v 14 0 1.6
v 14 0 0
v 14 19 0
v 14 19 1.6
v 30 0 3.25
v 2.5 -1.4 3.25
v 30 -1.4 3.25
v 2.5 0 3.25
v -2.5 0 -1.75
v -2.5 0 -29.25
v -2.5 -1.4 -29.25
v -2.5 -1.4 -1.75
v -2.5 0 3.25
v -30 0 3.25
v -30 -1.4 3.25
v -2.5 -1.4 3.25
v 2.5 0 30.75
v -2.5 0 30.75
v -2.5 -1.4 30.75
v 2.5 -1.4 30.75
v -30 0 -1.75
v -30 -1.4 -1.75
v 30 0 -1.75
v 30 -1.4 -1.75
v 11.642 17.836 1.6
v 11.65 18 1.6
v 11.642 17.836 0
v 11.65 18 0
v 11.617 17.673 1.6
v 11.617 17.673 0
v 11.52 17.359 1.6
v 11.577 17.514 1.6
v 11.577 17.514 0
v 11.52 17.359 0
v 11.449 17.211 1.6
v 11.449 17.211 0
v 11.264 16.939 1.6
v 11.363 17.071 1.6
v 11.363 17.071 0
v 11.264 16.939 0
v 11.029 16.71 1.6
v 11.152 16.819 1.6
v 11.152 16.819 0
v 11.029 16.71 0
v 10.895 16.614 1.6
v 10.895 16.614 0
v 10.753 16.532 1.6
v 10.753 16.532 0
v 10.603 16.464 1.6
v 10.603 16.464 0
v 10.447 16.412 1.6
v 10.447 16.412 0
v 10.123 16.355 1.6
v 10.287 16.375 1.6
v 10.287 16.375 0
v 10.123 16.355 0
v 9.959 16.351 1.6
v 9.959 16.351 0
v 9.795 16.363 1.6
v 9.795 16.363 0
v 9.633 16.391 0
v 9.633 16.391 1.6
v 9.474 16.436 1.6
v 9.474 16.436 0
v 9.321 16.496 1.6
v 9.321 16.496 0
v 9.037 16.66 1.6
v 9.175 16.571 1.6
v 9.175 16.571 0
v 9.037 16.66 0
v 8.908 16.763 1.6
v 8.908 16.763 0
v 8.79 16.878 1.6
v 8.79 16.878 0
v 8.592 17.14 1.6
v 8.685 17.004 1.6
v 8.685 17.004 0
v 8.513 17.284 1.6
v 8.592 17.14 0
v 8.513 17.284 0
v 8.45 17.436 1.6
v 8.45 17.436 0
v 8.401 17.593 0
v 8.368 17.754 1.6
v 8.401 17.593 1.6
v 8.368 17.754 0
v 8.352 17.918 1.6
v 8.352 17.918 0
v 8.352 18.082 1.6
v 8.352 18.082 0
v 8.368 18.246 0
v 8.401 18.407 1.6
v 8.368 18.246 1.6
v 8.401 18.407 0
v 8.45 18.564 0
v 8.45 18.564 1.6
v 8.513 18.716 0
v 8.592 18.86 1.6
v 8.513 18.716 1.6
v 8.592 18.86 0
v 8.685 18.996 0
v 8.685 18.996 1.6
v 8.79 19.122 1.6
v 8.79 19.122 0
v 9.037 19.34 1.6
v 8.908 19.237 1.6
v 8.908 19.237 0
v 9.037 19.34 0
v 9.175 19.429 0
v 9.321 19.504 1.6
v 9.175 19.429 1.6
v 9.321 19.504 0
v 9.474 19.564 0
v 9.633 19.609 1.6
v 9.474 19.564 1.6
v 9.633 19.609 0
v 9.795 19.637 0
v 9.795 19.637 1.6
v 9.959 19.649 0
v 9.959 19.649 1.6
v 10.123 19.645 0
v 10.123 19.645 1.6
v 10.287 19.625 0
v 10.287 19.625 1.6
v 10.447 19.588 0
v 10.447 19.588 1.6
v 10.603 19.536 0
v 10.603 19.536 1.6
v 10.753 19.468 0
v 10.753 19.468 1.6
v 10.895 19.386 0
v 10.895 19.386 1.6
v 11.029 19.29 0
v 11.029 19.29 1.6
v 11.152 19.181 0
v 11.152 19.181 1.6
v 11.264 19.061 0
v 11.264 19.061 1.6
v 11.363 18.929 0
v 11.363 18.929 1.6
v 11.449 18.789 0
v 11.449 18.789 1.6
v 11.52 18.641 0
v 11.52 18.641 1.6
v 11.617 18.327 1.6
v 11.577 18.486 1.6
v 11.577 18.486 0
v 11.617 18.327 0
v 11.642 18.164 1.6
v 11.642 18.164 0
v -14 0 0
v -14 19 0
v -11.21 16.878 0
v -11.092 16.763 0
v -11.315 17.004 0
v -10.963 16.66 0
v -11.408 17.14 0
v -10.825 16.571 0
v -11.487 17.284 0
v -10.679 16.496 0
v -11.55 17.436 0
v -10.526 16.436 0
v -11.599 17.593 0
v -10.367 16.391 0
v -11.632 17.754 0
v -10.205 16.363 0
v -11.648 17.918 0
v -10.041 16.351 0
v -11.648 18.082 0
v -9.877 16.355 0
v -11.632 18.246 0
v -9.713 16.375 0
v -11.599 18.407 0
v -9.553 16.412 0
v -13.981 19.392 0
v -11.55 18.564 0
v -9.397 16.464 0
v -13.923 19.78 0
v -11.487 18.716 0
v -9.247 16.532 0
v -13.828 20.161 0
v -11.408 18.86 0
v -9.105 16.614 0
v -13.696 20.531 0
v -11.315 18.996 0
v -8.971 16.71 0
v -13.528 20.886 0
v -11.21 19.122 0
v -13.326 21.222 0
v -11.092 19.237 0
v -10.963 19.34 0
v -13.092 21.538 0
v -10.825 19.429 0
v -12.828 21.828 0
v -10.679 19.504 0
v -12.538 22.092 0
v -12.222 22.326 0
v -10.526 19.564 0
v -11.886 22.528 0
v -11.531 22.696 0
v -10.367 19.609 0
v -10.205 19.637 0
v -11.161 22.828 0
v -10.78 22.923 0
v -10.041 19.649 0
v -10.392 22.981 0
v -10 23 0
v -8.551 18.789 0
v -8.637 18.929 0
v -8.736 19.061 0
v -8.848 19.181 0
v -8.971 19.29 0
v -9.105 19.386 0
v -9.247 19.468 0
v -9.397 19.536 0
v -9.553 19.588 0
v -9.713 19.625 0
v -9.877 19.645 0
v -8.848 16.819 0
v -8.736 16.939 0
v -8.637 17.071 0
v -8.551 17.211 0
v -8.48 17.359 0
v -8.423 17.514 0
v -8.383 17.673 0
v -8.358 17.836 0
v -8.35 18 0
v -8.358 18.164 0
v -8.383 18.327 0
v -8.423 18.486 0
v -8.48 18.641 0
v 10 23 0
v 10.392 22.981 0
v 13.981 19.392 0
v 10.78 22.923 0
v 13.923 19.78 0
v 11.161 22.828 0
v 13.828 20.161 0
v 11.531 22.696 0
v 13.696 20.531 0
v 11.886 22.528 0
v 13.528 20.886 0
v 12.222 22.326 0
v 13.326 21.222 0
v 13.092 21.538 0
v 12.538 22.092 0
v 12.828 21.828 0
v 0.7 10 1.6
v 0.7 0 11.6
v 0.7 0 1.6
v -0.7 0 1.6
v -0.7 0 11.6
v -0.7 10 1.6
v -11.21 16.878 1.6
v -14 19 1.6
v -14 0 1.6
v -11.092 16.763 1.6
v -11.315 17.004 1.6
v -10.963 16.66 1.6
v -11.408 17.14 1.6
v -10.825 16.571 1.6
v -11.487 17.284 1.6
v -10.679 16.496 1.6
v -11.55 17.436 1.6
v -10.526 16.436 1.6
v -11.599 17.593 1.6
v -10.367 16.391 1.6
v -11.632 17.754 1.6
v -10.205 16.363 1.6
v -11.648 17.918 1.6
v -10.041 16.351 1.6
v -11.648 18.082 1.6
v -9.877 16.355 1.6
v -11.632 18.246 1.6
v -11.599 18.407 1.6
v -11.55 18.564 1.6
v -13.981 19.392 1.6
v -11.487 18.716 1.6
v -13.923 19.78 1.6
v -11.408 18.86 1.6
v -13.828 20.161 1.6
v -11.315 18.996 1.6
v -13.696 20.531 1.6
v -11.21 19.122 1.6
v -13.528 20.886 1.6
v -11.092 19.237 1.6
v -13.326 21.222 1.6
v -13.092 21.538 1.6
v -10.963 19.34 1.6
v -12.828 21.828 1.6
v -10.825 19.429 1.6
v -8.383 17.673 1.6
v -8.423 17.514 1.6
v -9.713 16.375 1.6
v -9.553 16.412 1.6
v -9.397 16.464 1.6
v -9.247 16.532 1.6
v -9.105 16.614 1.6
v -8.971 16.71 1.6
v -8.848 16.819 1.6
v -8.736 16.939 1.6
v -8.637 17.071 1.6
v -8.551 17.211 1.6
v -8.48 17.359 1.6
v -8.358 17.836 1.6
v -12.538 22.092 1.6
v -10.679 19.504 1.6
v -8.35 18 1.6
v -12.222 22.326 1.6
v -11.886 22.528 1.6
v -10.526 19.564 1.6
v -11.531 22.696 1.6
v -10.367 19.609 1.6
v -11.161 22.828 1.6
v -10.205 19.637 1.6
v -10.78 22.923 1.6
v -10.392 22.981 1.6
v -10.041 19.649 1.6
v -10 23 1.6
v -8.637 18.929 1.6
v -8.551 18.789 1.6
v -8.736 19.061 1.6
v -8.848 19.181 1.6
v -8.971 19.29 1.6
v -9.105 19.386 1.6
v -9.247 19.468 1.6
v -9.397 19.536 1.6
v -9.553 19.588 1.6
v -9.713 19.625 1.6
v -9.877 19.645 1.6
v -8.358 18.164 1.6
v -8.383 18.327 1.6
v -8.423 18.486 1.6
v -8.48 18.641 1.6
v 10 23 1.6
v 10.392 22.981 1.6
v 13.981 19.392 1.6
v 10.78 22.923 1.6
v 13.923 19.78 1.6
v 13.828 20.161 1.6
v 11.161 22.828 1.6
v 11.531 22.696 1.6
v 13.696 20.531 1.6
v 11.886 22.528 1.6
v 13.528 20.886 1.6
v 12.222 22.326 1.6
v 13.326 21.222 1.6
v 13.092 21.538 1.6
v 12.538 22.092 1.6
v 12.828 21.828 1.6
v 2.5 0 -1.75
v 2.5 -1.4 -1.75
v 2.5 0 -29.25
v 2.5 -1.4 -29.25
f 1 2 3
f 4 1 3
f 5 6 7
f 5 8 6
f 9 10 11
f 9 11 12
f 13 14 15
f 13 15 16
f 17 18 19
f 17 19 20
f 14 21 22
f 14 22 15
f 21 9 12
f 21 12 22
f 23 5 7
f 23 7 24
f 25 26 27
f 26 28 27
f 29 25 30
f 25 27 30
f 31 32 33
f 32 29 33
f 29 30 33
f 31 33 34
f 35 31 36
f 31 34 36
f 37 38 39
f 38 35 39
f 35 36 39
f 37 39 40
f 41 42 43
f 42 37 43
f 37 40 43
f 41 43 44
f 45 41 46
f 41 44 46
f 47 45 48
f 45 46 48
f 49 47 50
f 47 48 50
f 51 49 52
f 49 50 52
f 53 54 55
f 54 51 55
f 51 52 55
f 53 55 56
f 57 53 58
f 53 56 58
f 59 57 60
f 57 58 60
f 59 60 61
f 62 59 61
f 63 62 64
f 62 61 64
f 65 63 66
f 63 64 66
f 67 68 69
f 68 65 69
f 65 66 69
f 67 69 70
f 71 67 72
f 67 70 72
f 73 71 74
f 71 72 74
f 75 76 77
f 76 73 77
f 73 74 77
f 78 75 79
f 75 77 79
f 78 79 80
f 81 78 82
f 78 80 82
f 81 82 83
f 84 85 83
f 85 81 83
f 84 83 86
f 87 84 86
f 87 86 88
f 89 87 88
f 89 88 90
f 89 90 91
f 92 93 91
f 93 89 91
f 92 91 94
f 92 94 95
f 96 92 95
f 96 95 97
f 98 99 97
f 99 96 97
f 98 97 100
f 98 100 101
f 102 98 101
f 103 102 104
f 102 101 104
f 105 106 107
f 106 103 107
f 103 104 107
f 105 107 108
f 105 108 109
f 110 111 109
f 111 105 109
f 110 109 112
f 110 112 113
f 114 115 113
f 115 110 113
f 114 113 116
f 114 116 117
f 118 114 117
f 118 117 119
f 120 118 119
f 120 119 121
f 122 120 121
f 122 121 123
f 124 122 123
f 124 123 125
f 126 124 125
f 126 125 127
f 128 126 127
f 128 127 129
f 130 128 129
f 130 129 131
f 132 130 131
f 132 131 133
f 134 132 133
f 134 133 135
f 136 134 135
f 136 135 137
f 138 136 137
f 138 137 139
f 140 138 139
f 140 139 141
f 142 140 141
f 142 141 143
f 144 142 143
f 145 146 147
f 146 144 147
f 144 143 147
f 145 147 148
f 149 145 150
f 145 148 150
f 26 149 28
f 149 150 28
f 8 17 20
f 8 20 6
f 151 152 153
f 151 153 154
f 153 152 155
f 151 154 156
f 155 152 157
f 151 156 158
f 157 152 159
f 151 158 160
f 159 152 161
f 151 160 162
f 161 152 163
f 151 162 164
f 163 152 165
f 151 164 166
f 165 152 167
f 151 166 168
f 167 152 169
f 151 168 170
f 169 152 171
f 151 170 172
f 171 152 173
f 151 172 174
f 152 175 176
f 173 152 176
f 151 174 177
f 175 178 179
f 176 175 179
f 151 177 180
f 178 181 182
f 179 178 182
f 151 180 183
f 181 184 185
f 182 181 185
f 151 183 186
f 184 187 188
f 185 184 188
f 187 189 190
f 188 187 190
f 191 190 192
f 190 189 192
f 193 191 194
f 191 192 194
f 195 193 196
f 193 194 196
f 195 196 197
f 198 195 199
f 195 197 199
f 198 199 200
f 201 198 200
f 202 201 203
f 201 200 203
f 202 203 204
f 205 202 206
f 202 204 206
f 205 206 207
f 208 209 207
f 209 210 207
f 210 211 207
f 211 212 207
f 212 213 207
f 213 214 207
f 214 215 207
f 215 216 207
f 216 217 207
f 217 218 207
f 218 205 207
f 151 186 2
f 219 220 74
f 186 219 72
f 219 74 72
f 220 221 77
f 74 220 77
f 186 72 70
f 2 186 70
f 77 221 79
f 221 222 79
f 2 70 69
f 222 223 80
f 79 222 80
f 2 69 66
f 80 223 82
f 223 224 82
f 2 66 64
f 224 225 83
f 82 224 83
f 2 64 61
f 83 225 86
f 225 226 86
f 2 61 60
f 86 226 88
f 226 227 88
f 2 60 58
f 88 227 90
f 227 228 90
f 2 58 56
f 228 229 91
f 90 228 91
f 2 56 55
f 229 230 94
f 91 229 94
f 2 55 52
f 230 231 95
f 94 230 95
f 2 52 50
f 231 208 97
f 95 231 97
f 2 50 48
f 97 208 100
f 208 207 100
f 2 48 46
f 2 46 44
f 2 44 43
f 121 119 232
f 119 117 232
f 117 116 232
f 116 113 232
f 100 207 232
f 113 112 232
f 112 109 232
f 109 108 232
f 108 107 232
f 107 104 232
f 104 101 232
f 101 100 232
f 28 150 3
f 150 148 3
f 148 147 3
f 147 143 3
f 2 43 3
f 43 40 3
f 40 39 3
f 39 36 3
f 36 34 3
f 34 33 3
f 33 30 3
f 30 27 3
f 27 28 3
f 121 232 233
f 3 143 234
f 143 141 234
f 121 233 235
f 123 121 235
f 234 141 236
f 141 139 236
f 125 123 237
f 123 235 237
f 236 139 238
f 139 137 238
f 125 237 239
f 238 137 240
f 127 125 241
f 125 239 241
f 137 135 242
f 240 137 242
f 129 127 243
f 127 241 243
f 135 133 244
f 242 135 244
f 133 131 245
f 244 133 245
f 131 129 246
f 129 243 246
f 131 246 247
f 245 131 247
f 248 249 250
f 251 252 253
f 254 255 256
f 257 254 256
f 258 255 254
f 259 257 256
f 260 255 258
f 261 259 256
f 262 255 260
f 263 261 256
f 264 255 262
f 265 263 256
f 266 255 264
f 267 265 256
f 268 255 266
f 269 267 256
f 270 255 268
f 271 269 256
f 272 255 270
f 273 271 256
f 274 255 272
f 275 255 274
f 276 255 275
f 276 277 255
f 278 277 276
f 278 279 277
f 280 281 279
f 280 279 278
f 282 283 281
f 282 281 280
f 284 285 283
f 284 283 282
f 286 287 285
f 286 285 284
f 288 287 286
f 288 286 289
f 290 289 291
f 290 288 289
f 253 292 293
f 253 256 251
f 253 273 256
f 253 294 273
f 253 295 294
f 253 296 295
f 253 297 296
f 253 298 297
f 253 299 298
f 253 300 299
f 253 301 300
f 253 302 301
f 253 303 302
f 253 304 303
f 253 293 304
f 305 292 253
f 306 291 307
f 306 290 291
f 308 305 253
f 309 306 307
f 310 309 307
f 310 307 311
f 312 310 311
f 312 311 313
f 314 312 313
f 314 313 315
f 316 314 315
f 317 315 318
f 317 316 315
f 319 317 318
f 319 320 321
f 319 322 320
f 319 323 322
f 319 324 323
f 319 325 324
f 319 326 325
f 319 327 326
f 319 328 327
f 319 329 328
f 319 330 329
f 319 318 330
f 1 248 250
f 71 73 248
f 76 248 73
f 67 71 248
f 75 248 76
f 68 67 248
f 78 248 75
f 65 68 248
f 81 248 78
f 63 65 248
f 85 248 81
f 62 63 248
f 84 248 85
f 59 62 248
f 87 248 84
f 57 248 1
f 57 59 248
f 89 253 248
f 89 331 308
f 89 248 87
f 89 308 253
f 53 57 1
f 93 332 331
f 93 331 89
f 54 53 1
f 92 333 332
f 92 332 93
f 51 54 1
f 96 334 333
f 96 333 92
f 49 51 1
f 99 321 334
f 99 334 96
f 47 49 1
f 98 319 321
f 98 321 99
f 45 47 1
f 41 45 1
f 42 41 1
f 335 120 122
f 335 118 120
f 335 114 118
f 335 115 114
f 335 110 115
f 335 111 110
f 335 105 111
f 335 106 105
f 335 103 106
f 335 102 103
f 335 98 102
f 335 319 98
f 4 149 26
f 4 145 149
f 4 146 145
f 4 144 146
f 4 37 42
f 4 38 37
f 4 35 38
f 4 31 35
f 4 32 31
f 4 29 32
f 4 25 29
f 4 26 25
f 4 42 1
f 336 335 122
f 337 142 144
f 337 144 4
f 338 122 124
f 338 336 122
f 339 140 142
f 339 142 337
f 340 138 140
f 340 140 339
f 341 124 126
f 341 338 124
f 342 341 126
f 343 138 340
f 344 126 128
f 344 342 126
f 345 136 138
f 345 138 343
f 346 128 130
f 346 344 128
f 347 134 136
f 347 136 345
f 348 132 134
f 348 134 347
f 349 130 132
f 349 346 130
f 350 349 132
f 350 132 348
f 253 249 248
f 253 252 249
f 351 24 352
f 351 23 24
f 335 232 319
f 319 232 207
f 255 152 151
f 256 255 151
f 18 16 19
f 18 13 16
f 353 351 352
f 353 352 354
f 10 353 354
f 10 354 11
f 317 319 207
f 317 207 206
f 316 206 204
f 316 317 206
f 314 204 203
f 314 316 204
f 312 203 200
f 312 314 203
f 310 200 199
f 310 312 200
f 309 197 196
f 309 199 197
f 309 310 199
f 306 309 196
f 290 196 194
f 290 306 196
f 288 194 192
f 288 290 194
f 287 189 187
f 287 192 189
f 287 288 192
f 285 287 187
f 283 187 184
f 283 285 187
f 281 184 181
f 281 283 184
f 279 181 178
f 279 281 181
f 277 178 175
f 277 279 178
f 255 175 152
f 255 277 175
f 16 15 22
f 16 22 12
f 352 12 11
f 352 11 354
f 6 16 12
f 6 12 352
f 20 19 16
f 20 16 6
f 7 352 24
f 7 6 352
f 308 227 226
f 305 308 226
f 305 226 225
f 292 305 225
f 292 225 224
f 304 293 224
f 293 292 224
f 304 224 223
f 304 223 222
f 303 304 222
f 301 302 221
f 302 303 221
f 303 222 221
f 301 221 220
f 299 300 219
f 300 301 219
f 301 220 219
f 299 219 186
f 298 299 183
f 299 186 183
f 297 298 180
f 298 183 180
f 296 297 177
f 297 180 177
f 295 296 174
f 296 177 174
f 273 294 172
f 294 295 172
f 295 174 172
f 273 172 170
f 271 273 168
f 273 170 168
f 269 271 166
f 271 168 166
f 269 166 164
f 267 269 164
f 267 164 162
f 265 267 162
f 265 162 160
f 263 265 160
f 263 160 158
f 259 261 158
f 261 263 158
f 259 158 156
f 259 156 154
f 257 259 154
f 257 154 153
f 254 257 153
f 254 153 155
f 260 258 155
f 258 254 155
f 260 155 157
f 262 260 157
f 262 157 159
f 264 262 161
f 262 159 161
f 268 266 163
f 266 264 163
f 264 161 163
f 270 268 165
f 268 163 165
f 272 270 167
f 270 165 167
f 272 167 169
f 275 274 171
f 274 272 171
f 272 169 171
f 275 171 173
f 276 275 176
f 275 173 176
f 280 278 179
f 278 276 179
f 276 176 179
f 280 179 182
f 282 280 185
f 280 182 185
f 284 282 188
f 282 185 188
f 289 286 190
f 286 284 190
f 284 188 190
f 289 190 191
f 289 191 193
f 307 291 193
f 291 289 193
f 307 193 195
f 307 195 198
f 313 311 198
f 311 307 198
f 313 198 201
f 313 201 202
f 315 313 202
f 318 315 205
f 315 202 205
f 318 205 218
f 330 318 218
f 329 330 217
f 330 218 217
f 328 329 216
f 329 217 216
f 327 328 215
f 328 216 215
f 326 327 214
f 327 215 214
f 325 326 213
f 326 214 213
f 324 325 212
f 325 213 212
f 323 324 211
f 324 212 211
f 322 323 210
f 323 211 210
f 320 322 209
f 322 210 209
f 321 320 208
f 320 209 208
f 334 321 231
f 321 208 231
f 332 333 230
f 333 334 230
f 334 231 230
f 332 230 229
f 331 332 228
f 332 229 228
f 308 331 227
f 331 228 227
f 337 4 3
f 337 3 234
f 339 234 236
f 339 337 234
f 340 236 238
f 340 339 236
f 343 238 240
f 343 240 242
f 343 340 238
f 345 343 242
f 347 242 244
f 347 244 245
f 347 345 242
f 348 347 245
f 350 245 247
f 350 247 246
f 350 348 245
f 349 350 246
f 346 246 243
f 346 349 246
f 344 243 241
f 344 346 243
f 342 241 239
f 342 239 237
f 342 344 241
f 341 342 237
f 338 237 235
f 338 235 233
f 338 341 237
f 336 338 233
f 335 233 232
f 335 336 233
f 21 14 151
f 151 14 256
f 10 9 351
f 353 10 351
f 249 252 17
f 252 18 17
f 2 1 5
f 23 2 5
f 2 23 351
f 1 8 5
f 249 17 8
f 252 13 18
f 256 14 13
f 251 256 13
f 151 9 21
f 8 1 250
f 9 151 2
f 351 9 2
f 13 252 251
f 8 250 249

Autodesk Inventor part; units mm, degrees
ref_plane "YZ Plane" through (0, 0, 0) normal (1, 0, 0) x (0, 1, 0)
ref_plane "XZ Plane" through (0, 0, 0) normal (0, 1, 0) x (-1, 0, 0)
ref_plane "XY Plane" through (0, 0, 0) normal (0, 0, 1) x (1, 0, 0)
sketch "スケッチ1" plane through (0, 0, 0) normal (0, 0, 1) x (1, 0, 0)
  line L0 (-14, 0) -> (14, 0)
  line L1 (14, 0) -> (14, 23)
  line L2 (14, 23) -> (-14, 23)
  line L3 (-14, 23) -> (-14, 0)
  circle A0 centre (-10, 18) radius 1.65
  circle A1 centre (10, 18) radius 1.65
  point P0 (0, 0)
  dimension "d0" = 3.3
  dimension "d1" = 3.3
  dimension "d2" = 0
  dimension "d3" = 20
  dimension "d4" = 18
  dimension "d5" = 10
  dimension "d6" = 23
  dimension "d7" = 28
  dimension "d8" = 14
  dimension "d9" = 0
extrude "押し出し1" add sketch "スケッチ1" along normal blind 1.6
sketch "スケッチ2" plane through (-14, 0, 0) normal (0, -1, 0) x (1, 0, 0)
  line L0 (0, 0) -> (28, 0) projected
  line L1 (28, 0) -> (28, 1.6) projected
  line L2 (0, 1.6) -> (28, 1.6) projected
  line L3 (0, 0) -> (0, 1.6) projected
  line L4 (-16, 3.25) -> (44, 3.25)
  line L5 (44, 3.25) -> (44, -1.75)
  line L6 (44, -1.75) -> (-16, -1.75)
  line L7 (-16, -1.75) -> (-16, 3.25)
  line L8 (11.5, 30.75) -> (16.5, 30.75)
  line L9 (16.5, 30.75) -> (16.5, -29.25)
  line L10 (16.5, -29.25) -> (11.5, -29.25)
  line L11 (11.5, -29.25) -> (11.5, 30.75)
  point P0 (14, 0)
  dimension "d12" = 60
  dimension "d13" = 60
  dimension "d14" = 5
  dimension "d15" = 5
  dimension "d16" = 1.75
  dimension "d17" = 2.5
  dimension "d18" = 30
  dimension "d19" = 29.25
extrude "押し出し2" add sketch "スケッチ2" along normal blind 1.4
sketch "スケッチ3" plane through (0, 0, 0) normal (1, 0, 0) x (0, 1, 0)
  line L0 (-1.4, 3.25) -> (0, 3.25) projected
  line L1 (0, 30.75) -> (0, 3.25) projected
  line L2 (0, 30.75) -> (-1.4, 30.75) projected
  line L3 (-1.4, 3.25) -> (-1.4, 30.75) projected
  line L4 (0, -1.75) -> (-1.4, -1.75) projected
  line L5 (-1.4, -29.25) -> (-1.4, -1.75) projected
  line L6 (0, -29.25) -> (-1.4, -29.25) projected
  line L7 (0, -1.75) -> (0, -29.25) projected
  line L8 (0, 0) -> (23, 0) projected
  line L9 (23, 0) -> (23, 1.6) projected
  line L10 (0, 1.6) -> (23, 1.6) projected
  line L11 (0, 0) -> (0, 1.6) projected
  line L12 (0, 11.6) -> (10, 1.6)
  line L13 (10, 0) -> (0, -10)
  line L14 (10, 0) -> (10, 1.6)
  line L15 (0, 1.6) -> (10, 1.6)
  line L16 (10, 0) -> (0, 0)
  line L17 (0, -10) -> (0, 0)
  line L18 (0, 1.6) -> (0, 11.6)
  dimension "d22" = 45
  dimension "d23" = 45
  dimension "d24" = 0
  dimension "d25" = 10
extrude "押し出し3" add sketch "スケッチ3" along normal mid plane 1.4 contours L1 L12 L10 L18
fillet "フィレット1" radius 4 2 edges at (-14, 23, 0.8) (14, 23, 0.8)
equation "\"d1\" = d0"
equation "\"d5\" = 0.5 * d3"
equation "\"d8\" = 0.5 * d7"
equation "\"d13\" = d12"
equation "\"d15\" = d14"
equation "\"d17\" = 0.5 * d15"
equation "\"d18\" = 0.5 * d13"
equation "\"d23\" = d22"
properties part number "thrust-checker"
